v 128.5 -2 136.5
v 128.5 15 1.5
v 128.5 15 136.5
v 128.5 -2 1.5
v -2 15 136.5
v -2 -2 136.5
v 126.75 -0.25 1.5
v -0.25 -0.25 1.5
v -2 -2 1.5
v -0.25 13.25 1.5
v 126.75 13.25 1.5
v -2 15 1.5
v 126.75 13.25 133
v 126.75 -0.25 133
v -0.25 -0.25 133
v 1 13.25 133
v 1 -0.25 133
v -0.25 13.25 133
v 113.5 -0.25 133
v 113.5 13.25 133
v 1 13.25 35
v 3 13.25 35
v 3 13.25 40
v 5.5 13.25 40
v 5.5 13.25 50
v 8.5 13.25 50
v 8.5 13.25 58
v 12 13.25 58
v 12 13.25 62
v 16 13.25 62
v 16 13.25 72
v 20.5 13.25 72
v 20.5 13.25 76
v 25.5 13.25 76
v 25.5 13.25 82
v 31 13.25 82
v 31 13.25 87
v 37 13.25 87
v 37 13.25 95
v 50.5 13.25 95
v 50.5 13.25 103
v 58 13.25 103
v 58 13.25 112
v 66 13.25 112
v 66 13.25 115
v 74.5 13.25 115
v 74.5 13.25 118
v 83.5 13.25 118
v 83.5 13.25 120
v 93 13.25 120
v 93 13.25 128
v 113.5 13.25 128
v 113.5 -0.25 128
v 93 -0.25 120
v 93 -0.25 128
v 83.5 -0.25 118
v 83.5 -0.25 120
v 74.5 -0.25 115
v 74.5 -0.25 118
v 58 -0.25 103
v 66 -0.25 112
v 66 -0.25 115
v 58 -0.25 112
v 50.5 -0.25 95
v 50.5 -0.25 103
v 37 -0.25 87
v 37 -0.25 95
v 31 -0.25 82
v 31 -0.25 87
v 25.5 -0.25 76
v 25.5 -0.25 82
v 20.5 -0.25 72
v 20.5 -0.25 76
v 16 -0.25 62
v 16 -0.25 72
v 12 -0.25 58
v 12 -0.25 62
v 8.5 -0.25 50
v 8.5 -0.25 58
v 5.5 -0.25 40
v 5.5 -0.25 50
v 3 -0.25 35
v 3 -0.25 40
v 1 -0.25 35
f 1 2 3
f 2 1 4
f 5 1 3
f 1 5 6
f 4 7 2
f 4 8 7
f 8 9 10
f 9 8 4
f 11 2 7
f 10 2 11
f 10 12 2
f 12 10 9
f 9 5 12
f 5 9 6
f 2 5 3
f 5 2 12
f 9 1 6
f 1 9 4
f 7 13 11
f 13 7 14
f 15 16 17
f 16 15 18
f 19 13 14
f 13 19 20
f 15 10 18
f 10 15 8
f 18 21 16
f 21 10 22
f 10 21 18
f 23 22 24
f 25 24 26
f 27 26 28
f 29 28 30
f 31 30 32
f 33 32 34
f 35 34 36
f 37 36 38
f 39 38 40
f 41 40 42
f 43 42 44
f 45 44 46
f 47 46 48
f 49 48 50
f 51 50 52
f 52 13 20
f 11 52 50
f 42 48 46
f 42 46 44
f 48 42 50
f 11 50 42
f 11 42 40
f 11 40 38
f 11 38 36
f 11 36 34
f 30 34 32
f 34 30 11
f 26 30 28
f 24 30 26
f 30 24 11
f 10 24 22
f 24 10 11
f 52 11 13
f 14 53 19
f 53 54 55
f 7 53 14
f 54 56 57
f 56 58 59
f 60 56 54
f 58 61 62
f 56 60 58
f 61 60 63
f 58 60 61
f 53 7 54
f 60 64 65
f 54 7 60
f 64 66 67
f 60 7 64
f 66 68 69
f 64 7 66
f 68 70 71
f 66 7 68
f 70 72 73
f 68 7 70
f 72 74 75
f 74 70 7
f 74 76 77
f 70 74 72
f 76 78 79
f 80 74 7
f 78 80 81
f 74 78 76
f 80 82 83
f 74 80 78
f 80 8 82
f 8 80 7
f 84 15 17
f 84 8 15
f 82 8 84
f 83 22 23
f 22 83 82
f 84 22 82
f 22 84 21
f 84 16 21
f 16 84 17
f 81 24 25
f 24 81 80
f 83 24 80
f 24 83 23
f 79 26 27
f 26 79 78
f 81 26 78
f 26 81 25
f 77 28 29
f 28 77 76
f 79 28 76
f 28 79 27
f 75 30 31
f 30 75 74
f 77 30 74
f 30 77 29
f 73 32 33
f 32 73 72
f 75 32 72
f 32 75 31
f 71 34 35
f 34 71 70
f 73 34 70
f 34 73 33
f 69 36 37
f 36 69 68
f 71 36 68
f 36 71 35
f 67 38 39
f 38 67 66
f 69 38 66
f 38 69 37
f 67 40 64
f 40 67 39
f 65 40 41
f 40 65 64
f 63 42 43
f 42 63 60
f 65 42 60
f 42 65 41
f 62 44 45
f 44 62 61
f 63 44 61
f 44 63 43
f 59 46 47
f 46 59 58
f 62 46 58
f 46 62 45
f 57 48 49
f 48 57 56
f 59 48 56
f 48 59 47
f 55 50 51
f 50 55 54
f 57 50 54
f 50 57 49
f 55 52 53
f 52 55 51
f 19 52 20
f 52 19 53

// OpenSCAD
/*
 * Drill box
 */
 
$fn = 72;
 
slack = 0.5;   // mechanical clearance
space = 1.0;     // space between drills
wall = 1.5;

bds = [
	[ 7, 110],
    [ 7.5, 113 ],
    [ 8, 116 ],
    [  8.5, 118 ],
    [ 9, 126 ],
    [ 9.5, 126 ],
	[ 10, 133 ],
];

sds = [
    [ 1, 33 ],
    [ 1.5, 38 ],
    [ 2, 48 ],
    [ 2.5, 56 ],
    [ 3, 60 ],
    [ 3.5, 70 ],
    [ 4, 74 ],
    [ 4.5, 80],
	[ 5, 85 ],
	[ 5.5, 93],
	[ 6, 93],
	[ 6.5, 101 ]
];
all = [
    [ 1, 33 ],
    [ 1.5, 38 ],
    [ 2, 48 ],
    [ 2.5, 56 ],
    [ 3, 60 ],
    [ 3.5, 70 ],
    [ 4, 74 ],
    [ 4.5, 80],
	[ 5, 85 ],
	[ 5.5, 93],
	[ 6, 93],
	[ 6.5, 101 ],
	[ 7, 110],
    [ 7.5, 113 ],
    [ 8, 116 ],
    [  8.5, 118 ],
    [ 9, 126 ],
    [ 9.5, 126 ],
	[ 10, 133 ],
];

/*
 * Cumulated size of the drills 
 * d = [[diameter, length], ...]
 * i : index in the list
 */
function sigma(d, i) =
	(i == 0 ? d[i][0] : d[i][0] + sigma(d, i - 1));

/*
 * Max diameter
 */ 
function max_dia (d, i) =
	(i == 0) ? d[i][0] : max(d[i][0], max_dia (d, i-1)) ;

/*
 * Max length
 */
function max_len (d, i) =
	(i == 0) ? d[i][1] : max(d[i][1], max_len (d, i-1)) ;

/*
 * Smallest length
 */ 
function min_len (d, i) =
	(i == 0) ? d[i][1] : min(d[i][1], min_len (d, i-1)) ;

height = 35;


/**
 * Generate the box for the drills
 */
module box (dr) {
	len = len(dr); 
	length = sigma(dr, len - 1) + wall * 2 + space * len;
	width = max_dia(dr, len - 1) + 2 * wall;
	height = 25;
	
	echo ("box elt=", len);
	echo ("max_dia", max_dia(dr, len -1));
	echo ("sigma_dia", sigma(dr, len -1));
	echo ("length=", length);

	difference () {
		color("red")
		cube([length, width, height]);

		// holes
		for (i = [0: len -1]) {
			// echo ("translate: ",wall + sigma(dr, i) - dr[i][0] / 2 + space * i);
			translate ([wall + sigma(dr, i) - dr[i][0] / 2 + space * i, width/2, wall])
				# cylinder(dr[i][1], d= dr[i][0] + slack);
		}		
	}
	
	// The base
	translate([-(wall + slack), -(wall + slack), 0])
		cube([length + 2 * (wall + slack), width + 2 * (wall + slack), wall]);
}

/**
 * Generate the box for the drills
 */
module top (dr) {
	len = len(dr) ;
	length = sigma(dr, len - 1) + wall * 2 + space * len;
	width = max_dia(dr, len - 1) + 2 * wall;
	height = max_len(dr, len - 1);

	ext_len = length + 2 * (wall + slack);
	ext_width = width + 2 * (wall + slack);
	ext_height = height + wall + slack;
	
	# difference() {
		color("green")
		translate ([- (wall + slack), - (wall + slack), wall])
		cube ([ext_len, ext_width, ext_height]);
		
		translate ([-slack / 2, -slack / 2, 0])
		cube([length + slack, width + slack, height]);
	}
	
	// holes
	for (i = [0: len -1]) {
		// echo ("translate: ",wall + sigma(dr, i) - dr[i][0] / 2 + space * i);
		// translate ([wall + sigma(dr, i) - dr[i][0] / 2 + space * i, width/2, wall + height - (height - dr[i][1]) + slack])
		translate ([wall + sigma(dr, i) - dr[i][0] / 2 + space * i, 
			width/2, 
			wall + height - (height - dr[i][1]) + slack - dr[i][1]/ 2 + height / 2])
		cube([dr[i][0] + space, width + slack, height - dr[i][1]], center=true);
		// cylinder(height - dr[i][1], d= dr[i][0] + slack);
	}
}

//box(all);
top (all);
